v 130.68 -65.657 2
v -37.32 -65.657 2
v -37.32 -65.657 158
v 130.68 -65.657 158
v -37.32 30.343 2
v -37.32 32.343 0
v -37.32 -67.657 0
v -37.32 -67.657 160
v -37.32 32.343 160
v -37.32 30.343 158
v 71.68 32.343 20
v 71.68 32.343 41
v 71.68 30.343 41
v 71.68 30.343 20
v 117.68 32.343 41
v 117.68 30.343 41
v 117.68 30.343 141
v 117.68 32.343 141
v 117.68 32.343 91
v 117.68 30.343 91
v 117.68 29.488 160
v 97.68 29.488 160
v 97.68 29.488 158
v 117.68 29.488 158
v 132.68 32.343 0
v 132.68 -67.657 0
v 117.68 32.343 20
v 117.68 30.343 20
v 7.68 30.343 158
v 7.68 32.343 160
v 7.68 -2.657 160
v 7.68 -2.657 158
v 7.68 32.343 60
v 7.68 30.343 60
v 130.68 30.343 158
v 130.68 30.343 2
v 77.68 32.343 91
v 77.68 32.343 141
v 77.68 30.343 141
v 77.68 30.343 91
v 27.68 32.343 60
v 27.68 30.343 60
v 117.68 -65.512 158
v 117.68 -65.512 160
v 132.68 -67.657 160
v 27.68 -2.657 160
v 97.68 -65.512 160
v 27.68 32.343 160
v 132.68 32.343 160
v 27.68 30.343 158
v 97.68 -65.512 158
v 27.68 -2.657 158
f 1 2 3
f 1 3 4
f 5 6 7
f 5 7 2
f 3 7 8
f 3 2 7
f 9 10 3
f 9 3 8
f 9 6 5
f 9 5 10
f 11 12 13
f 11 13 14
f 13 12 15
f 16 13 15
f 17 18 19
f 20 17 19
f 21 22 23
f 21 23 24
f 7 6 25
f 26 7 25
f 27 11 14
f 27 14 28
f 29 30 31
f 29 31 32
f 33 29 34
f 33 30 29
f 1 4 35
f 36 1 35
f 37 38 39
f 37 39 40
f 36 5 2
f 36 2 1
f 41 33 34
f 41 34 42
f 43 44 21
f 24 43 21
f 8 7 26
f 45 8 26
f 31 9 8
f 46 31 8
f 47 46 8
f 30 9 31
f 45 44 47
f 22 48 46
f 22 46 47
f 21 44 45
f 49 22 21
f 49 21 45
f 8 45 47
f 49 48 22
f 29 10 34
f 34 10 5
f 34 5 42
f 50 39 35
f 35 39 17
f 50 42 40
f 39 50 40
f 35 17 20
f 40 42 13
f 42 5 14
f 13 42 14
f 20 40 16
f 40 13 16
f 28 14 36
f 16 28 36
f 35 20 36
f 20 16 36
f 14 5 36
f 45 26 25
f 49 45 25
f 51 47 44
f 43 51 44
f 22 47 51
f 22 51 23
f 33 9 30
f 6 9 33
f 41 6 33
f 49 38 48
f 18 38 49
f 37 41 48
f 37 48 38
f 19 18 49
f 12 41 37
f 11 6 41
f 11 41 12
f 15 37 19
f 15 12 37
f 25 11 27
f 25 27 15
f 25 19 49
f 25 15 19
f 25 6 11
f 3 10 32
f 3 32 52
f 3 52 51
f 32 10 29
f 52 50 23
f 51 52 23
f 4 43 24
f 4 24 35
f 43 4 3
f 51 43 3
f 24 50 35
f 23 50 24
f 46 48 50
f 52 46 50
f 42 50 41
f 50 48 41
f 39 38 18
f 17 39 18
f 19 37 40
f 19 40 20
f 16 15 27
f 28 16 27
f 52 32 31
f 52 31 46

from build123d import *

# Parameters (mm, degrees)
SKETCH1_W           = 200
SKETCH1_H           = 100
BOSS_EXTRUDE1_DEPTH = 160
SHELL3_T            = -2
SKETCH2_W           = 46
SKETCH2_H           = 21
SKETCH2_W_2         = 40
SKETCH2_H_2         = 50
CUT_EXTRUDE1_DEPTH  = 68
SKETCH4_W           = 20
SKETCH4_H           = 95
CUT_EXTRUDE2_DEPTH  = 18
SKETCH6_W           = 20
SKETCH6_H           = 100
CUT_EXTRUDE3_DEPTH  = 35
SKETCH8_W           = 167.837082792
SKETCH8_H           = 105.374637329
CUT_EXTRUDE4_DEPTH  = 30


with BuildPart() as part:
    # Sketch1 → Boss-Extrude1 (new body)
    with BuildSketch(Plane.XY):
        with Locations((32.679929783, -17.656524283)):
            Rectangle(SKETCH1_W, SKETCH1_H)
    extrude(amount=BOSS_EXTRUDE1_DEPTH)

    # Shell3
    shell3_openings = [part.faces().sort_by_distance(p)[0] for p in [
        (-67.320070217, -17.656524283, 80),
    ]]
    offset(amount=SHELL3_T, openings=shell3_openings, kind=Kind.INTERSECTION)

    # Sketch2 → Cut-Extrude1 (cut)
    with BuildSketch(Plane(origin=(0, 32.343475717, 0), x_dir=(1, 0, 0), z_dir=(0, 1, 0))):
        with Locations((94.679929783, -30.5)):
            Rectangle(SKETCH2_W, SKETCH2_H)
        with Locations((97.679929783, -116)):
            Rectangle(SKETCH2_W_2, SKETCH2_H_2)
    extrude(amount=-CUT_EXTRUDE1_DEPTH, mode=Mode.SUBTRACT)

    # Sketch4 → Cut-Extrude2 (cut)
    with BuildSketch(Plane.XY.offset(160)):
        with Locations((107.679929783, -18.012169352)):
            Rectangle(SKETCH4_W, SKETCH4_H)
    extrude(amount=-CUT_EXTRUDE2_DEPTH, mode=Mode.SUBTRACT)

    # Sketch6 → Cut-Extrude3 (cut)
    with BuildSketch(Plane(origin=(0, 32.343475717, 0), x_dir=(1, 0, 0), z_dir=(0, 1, 0))):
        with Locations((17.679929783, -110)):
            Rectangle(SKETCH6_W, SKETCH6_H)
    extrude(amount=-CUT_EXTRUDE3_DEPTH, mode=Mode.SUBTRACT)

    # Sketch8 → Cut-Extrude4 (cut)
    with BuildSketch(Plane.ZY.offset(67.320070217)):
        with Locations((79.323733366, -18.148354562)):
            Rectangle(SKETCH8_W, SKETCH8_H)
    extrude(amount=-CUT_EXTRUDE4_DEPTH, mode=Mode.SUBTRACT)


solid = part.part
